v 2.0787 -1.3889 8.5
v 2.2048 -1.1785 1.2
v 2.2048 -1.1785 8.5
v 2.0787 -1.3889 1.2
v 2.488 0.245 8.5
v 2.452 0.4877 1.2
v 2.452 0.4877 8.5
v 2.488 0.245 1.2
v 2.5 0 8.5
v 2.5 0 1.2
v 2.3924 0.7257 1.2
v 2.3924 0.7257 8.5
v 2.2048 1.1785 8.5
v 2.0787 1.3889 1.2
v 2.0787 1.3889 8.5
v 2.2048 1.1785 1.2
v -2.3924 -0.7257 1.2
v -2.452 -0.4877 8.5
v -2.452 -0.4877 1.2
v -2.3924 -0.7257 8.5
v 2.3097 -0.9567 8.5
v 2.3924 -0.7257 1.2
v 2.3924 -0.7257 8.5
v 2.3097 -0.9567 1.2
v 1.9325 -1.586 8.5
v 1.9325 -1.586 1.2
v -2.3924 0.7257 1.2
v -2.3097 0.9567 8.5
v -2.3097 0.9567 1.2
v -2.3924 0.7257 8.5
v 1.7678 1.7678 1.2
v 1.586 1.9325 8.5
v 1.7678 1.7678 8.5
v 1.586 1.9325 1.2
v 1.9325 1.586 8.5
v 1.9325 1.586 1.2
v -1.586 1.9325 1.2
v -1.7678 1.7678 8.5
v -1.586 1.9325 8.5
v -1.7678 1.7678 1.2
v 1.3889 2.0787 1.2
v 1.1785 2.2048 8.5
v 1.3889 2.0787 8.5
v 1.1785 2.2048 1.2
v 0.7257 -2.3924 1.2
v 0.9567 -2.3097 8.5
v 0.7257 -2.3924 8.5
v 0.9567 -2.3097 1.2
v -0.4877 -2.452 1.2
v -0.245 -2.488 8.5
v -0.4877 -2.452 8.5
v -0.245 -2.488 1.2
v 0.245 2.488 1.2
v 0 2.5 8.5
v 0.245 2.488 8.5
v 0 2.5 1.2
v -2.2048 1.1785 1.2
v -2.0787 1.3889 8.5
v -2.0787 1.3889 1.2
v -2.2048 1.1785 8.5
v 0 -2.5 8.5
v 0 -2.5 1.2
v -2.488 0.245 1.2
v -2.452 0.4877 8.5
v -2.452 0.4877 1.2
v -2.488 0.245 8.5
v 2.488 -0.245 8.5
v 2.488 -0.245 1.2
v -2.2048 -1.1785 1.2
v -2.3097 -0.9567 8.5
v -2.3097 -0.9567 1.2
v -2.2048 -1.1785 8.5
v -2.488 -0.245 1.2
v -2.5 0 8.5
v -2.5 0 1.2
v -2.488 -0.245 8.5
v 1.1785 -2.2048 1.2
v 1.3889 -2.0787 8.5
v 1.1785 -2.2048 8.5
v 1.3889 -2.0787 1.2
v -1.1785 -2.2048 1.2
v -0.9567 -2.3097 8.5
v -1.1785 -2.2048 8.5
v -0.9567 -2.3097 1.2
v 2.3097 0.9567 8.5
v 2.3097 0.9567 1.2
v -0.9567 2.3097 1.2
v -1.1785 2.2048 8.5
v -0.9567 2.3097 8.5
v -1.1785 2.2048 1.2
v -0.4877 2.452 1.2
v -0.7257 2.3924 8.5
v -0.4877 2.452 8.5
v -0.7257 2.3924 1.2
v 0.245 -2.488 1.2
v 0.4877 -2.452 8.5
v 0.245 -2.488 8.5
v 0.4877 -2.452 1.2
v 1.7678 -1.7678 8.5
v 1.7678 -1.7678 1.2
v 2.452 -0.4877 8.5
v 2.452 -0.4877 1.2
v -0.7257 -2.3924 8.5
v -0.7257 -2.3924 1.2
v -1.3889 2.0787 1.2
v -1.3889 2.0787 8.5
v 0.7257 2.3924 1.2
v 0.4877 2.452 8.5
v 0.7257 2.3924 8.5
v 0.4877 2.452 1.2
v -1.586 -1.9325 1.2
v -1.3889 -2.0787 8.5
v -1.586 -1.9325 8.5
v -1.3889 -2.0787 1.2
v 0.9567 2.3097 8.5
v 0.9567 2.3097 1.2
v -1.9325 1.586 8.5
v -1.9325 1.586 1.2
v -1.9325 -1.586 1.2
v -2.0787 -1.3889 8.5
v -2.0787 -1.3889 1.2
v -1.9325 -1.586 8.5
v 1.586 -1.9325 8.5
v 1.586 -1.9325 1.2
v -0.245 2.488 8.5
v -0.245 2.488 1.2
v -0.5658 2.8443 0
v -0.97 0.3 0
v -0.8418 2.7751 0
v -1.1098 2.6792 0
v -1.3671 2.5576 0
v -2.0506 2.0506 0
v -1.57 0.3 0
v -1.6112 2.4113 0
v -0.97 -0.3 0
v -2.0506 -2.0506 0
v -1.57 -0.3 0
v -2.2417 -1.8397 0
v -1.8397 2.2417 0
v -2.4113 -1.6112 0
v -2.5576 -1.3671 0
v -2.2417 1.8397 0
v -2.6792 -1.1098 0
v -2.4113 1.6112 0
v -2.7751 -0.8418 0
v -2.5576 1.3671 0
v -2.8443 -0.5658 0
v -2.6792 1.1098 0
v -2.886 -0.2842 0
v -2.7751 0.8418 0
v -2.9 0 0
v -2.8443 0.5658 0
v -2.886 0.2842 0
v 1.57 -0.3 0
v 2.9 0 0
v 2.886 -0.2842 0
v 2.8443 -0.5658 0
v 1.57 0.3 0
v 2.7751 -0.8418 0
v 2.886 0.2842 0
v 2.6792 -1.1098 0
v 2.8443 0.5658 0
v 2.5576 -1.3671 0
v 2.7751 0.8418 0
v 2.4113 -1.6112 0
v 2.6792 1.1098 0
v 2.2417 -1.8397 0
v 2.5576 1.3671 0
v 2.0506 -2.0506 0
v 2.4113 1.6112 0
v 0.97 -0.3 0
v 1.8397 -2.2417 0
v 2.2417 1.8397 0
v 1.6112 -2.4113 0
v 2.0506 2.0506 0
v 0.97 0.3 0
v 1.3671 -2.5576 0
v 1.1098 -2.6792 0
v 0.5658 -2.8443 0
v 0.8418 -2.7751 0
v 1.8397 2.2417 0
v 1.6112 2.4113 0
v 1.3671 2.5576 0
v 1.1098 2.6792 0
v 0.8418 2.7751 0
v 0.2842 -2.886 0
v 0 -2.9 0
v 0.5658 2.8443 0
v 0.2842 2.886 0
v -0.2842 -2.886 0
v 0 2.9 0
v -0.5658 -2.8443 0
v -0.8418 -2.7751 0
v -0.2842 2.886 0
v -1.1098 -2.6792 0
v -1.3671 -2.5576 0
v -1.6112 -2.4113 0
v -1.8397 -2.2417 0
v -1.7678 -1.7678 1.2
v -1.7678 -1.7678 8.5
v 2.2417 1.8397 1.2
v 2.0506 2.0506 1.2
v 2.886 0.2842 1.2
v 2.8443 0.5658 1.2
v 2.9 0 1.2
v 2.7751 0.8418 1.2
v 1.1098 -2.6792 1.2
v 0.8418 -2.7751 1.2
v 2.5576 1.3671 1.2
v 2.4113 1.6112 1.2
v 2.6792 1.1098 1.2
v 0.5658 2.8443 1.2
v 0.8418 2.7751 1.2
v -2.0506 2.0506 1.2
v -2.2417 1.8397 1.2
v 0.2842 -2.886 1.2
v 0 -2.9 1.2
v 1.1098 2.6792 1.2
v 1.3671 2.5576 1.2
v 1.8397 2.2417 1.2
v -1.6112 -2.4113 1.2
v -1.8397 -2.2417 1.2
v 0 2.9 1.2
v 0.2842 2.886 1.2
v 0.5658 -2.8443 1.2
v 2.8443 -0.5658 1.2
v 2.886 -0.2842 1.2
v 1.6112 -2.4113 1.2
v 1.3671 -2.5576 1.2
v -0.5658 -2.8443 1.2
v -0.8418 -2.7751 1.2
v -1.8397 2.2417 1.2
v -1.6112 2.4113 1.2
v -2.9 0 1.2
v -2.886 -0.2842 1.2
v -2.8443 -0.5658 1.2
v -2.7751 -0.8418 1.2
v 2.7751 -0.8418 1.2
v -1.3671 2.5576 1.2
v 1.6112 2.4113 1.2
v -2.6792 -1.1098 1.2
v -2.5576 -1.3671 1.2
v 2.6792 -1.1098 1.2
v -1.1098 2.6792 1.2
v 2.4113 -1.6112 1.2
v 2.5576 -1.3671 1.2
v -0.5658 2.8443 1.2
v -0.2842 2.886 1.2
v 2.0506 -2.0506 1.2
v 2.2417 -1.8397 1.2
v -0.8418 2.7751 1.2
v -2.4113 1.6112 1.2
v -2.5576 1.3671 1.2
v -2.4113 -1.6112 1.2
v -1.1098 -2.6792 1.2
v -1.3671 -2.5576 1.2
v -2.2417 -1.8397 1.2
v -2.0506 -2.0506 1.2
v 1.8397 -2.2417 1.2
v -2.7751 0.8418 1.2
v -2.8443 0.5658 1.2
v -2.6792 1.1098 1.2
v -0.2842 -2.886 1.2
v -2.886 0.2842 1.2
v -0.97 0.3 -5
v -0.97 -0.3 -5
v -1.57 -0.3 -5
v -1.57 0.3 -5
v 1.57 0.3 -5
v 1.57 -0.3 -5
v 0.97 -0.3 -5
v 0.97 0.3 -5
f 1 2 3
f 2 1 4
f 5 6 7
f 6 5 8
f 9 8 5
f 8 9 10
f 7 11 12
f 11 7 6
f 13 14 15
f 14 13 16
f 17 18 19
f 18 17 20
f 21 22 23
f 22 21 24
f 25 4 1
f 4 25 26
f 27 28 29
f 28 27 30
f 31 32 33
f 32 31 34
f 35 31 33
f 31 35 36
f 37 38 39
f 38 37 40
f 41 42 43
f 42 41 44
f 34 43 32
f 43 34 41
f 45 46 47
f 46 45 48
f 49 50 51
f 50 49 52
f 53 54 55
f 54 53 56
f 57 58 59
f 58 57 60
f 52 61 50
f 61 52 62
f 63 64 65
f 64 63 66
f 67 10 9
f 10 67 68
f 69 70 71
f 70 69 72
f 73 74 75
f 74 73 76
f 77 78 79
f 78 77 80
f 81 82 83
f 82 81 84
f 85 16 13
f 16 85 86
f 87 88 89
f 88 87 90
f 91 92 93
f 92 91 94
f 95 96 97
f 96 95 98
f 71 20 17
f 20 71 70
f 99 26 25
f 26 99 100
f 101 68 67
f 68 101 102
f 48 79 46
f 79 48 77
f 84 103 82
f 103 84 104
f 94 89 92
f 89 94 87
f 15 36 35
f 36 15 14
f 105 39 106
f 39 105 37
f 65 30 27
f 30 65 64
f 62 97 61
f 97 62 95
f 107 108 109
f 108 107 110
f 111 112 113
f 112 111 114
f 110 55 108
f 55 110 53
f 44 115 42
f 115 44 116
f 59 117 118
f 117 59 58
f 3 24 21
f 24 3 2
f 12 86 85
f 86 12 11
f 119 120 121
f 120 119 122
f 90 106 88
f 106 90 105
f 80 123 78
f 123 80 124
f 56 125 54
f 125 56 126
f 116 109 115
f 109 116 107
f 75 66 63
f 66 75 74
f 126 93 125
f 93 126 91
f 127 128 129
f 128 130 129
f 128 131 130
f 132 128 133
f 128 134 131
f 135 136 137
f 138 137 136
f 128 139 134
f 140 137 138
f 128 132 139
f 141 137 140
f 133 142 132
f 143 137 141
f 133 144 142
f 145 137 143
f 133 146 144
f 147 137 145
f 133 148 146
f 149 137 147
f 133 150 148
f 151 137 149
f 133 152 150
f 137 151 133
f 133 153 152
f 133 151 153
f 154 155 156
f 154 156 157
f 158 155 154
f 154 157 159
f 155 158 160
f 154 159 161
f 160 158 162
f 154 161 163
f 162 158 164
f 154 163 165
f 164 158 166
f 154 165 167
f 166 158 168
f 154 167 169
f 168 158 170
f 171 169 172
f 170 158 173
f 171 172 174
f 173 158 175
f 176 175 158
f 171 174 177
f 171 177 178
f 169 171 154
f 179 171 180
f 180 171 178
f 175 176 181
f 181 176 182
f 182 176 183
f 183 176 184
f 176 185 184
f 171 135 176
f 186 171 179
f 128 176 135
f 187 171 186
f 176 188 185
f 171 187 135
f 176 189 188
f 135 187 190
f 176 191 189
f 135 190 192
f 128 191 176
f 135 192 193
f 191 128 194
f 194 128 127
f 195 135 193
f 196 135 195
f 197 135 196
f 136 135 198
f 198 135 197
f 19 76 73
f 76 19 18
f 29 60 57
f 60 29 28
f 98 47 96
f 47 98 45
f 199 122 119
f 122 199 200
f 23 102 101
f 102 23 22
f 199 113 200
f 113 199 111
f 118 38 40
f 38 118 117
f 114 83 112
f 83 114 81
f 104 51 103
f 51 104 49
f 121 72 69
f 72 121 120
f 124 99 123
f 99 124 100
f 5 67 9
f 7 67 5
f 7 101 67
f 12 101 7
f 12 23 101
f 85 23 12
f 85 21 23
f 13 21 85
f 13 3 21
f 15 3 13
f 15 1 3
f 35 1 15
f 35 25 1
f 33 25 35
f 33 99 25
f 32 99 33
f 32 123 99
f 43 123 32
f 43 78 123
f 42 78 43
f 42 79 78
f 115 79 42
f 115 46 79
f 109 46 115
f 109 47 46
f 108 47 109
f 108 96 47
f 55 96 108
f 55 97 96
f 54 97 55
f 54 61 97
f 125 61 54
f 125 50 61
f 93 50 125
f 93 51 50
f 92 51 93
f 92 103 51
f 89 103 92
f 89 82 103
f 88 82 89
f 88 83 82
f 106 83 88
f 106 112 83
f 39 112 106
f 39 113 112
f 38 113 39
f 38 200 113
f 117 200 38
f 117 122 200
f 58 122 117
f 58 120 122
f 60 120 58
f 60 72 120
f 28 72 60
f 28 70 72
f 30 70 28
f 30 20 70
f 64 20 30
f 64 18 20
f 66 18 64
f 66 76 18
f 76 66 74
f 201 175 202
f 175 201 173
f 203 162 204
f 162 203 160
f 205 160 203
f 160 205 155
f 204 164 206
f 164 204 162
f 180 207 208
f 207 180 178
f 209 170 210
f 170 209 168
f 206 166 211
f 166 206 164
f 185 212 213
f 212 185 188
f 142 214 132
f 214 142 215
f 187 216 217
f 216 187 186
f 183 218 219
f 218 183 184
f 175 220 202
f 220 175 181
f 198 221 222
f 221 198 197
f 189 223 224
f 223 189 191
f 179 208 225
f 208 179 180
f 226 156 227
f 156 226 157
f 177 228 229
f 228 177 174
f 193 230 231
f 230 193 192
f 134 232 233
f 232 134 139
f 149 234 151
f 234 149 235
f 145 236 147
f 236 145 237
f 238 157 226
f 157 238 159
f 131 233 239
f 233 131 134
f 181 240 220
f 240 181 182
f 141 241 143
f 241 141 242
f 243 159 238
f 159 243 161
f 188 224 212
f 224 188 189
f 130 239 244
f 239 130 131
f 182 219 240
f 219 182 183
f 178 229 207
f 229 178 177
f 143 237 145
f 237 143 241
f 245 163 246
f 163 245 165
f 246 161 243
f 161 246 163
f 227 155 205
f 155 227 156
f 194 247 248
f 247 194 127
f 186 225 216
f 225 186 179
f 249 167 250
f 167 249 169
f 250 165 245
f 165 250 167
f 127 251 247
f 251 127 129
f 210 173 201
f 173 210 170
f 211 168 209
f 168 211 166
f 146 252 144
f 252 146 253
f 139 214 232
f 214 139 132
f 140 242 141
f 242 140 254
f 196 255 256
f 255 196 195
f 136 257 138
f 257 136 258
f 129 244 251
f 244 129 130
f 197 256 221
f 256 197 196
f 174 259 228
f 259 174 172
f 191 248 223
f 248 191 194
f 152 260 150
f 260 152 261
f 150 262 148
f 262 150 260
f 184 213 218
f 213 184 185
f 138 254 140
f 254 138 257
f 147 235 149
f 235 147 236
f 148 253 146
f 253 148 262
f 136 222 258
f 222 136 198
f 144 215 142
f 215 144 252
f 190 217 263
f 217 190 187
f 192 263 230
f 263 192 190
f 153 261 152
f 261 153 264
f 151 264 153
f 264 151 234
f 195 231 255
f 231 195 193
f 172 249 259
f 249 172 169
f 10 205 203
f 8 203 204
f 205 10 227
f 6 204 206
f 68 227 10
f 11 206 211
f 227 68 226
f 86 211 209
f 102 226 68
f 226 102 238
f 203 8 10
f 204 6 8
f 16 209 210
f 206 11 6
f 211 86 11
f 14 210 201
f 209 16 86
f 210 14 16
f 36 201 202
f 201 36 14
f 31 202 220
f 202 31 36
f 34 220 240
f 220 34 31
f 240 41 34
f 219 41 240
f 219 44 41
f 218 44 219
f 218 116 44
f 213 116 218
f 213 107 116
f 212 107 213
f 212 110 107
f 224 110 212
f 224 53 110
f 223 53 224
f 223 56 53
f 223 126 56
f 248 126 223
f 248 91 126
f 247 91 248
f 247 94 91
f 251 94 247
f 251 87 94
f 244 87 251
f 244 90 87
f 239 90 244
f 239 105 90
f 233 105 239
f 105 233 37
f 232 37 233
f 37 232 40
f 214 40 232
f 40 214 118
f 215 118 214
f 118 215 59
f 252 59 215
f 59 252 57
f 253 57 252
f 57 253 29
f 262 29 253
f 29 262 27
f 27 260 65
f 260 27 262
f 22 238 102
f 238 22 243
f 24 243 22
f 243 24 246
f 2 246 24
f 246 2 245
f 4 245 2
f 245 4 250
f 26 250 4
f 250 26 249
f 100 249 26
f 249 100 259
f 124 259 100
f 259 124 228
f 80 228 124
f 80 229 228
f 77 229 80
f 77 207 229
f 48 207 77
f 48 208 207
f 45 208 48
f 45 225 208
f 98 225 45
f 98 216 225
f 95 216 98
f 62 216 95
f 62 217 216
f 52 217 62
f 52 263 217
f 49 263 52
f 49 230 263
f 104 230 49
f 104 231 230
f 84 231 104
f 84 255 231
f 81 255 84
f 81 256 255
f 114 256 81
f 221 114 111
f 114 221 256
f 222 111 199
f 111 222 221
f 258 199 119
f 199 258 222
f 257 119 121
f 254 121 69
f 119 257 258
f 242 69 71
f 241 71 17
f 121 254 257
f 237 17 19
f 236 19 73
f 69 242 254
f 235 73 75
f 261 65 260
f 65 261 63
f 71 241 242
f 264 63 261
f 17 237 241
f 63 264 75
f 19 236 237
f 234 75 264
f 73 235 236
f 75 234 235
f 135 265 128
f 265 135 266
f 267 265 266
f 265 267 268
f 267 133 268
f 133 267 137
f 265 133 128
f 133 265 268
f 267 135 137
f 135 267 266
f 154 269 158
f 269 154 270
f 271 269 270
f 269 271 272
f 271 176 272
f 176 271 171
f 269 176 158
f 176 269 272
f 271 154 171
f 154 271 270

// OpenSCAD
// Parameters
led_type = 0; //[0:2:1]
colour = 0; //[0:5:1]
lead = 5; //[2.5:10:0.5]
right_angle = 0; //[0:12:1]
overlap = 0.8; //[0.5:2:0.1]
d_round_5 = 5; //[2.5:10:0.1]
h_round_5 = 8.5; //[4:17:0.1]
rim_d_round_5 = 5.8; //[3:12:0.1]
rim_t_round_5 = 1.2; //[0.6:2.4:0.1]
pitch_round_5 = 2.54; //[1.5:5:0.01]
d_round_3 = 3; //[1.5:6:0.1]
h_round_3 = 5.2; //[2.5:10.4:0.1]
rim_d_round_3 = 3.6; //[2:7.2:0.1]
rim_t_round_3 = 0.9; //[0.5:1.8:0.1]
pitch_round_3 = 2; //[1:4:0.01]
rect_w = 5; //[2.5:10:0.1]
rect_d = 2; //[1:4:0.1]
rect_h = 7; //[3.5:14:0.1]
rect_rim_w = 5.6; //[2.8:11.2:0.1]
rect_rim_d = 2.6; //[1.3:5.2:0.1]
rect_rim_t = 1; //[0.5:2:0.1]
pitch_rect = 2.54; //[1.5:5:0.01]
lead_t = 0.6; //[0.3:1.2:0.05]
bend_radius = 0.9; //[0.5:2:0.1]

$fn = 64;

// Helpers: choose dimensions based on led_type
function body_h() = (led_type==0) ? h_round_5 : (led_type==1) ? h_round_3 : rect_h;
function body_d() = (led_type==0) ? d_round_5 : (led_type==1) ? d_round_3 : max(rect_w, rect_d);
function rim_t()  = (led_type==0) ? rim_t_round_5 : (led_type==1) ? rim_t_round_3 : rect_rim_t;
function pitch()  = (led_type==0) ? pitch_round_5 : (led_type==1) ? pitch_round_3 : pitch_rect;

// LED Module (base at z=0, extends upward)
module led_body() {
  if (led_type == 0) {
    union() {
      // Main body
      translate([0, 0, body_h()/2])
        cylinder(r=d_round_5/2, h=h_round_5, center=true);
      // Rim at base, overlapping into body
      translate([0, 0, rim_t()/2])
        cylinder(r=rim_d_round_5/2, h=rim_t_round_5, center=true);
    }
  } else if (led_type == 1) {
    union() {
      translate([0, 0, body_h()/2])
        cylinder(r=d_round_3/2, h=h_round_3, center=true);
      translate([0, 0, rim_t()/2])
        cylinder(r=rim_d_round_3/2, h=rim_t_round_3, center=true);
    }
  } else {
    union() {
      translate([0, 0, body_h()/2])
        cube([rect_w, rect_d, rect_h], center=true);
      translate([0, 0, rim_t()/2])
        cube([rect_rim_w, rect_rim_d, rect_rim_t], center=true);
    }
  }
}

// Leads Module (connected to rim/base with overlap)
module leads_geom() {
  p = pitch();
  // Ensure some penetration into LED base for a single connected solid
  z0 = -lead/2;                 // center of straight lead segment (extends from -lead..0)
  z_attach = lead_t/2 - overlap; // small overlap into z>0 region

  if (right_angle <= 0) {
    union() {
      // Straight leads: extend from z=-lead to z=+overlap (into LED)
      translate([-p/2, 0, (-lead + overlap)/2])
        cube([lead_t, lead_t, lead + overlap], center=true);
      translate([ p/2, 0, (-lead + overlap)/2])
        cube([lead_t, lead_t, lead + overlap], center=true);
    }
  } else {
    // Bent leads: vertical down, then horizontal back (negative Y)
    vlen = max(0.01, lead - right_angle);
    hlen = max(0.01, right_angle);

    union() {
      for (sx = [-1, 1]) {
        x = sx * p/2;

        // Vertical segment: from z=-vlen to z=+overlap
        translate([x, 0, (-vlen + overlap)/2])
          cube([lead_t, lead_t, vlen + overlap], center=true);

        // Horizontal segment: starts at z=0 (with overlap into LED), goes to -Y
        translate([x, -(hlen)/2, z_attach])
          cube([lead_t, hlen + overlap, lead_t], center=true);

        // Simple bend fillet (quarter torus) positioned to touch both segments
        // Place its center at the corner (x, -bend_radius, 0) and overlap slightly into LED
        translate([x, -bend_radius, -bend_radius + overlap/2])
          rotate([90, 0, 0])
            rotate_extrude(angle=90)
              translate([bend_radius, 0, 0])
                circle(r=lead_t/2);
      }
    }
  }
}

// Final Assembly: single connected solid (union of all geometry)
union() {
  color("red") led_body();
  color("Silver") leads_geom();
}
